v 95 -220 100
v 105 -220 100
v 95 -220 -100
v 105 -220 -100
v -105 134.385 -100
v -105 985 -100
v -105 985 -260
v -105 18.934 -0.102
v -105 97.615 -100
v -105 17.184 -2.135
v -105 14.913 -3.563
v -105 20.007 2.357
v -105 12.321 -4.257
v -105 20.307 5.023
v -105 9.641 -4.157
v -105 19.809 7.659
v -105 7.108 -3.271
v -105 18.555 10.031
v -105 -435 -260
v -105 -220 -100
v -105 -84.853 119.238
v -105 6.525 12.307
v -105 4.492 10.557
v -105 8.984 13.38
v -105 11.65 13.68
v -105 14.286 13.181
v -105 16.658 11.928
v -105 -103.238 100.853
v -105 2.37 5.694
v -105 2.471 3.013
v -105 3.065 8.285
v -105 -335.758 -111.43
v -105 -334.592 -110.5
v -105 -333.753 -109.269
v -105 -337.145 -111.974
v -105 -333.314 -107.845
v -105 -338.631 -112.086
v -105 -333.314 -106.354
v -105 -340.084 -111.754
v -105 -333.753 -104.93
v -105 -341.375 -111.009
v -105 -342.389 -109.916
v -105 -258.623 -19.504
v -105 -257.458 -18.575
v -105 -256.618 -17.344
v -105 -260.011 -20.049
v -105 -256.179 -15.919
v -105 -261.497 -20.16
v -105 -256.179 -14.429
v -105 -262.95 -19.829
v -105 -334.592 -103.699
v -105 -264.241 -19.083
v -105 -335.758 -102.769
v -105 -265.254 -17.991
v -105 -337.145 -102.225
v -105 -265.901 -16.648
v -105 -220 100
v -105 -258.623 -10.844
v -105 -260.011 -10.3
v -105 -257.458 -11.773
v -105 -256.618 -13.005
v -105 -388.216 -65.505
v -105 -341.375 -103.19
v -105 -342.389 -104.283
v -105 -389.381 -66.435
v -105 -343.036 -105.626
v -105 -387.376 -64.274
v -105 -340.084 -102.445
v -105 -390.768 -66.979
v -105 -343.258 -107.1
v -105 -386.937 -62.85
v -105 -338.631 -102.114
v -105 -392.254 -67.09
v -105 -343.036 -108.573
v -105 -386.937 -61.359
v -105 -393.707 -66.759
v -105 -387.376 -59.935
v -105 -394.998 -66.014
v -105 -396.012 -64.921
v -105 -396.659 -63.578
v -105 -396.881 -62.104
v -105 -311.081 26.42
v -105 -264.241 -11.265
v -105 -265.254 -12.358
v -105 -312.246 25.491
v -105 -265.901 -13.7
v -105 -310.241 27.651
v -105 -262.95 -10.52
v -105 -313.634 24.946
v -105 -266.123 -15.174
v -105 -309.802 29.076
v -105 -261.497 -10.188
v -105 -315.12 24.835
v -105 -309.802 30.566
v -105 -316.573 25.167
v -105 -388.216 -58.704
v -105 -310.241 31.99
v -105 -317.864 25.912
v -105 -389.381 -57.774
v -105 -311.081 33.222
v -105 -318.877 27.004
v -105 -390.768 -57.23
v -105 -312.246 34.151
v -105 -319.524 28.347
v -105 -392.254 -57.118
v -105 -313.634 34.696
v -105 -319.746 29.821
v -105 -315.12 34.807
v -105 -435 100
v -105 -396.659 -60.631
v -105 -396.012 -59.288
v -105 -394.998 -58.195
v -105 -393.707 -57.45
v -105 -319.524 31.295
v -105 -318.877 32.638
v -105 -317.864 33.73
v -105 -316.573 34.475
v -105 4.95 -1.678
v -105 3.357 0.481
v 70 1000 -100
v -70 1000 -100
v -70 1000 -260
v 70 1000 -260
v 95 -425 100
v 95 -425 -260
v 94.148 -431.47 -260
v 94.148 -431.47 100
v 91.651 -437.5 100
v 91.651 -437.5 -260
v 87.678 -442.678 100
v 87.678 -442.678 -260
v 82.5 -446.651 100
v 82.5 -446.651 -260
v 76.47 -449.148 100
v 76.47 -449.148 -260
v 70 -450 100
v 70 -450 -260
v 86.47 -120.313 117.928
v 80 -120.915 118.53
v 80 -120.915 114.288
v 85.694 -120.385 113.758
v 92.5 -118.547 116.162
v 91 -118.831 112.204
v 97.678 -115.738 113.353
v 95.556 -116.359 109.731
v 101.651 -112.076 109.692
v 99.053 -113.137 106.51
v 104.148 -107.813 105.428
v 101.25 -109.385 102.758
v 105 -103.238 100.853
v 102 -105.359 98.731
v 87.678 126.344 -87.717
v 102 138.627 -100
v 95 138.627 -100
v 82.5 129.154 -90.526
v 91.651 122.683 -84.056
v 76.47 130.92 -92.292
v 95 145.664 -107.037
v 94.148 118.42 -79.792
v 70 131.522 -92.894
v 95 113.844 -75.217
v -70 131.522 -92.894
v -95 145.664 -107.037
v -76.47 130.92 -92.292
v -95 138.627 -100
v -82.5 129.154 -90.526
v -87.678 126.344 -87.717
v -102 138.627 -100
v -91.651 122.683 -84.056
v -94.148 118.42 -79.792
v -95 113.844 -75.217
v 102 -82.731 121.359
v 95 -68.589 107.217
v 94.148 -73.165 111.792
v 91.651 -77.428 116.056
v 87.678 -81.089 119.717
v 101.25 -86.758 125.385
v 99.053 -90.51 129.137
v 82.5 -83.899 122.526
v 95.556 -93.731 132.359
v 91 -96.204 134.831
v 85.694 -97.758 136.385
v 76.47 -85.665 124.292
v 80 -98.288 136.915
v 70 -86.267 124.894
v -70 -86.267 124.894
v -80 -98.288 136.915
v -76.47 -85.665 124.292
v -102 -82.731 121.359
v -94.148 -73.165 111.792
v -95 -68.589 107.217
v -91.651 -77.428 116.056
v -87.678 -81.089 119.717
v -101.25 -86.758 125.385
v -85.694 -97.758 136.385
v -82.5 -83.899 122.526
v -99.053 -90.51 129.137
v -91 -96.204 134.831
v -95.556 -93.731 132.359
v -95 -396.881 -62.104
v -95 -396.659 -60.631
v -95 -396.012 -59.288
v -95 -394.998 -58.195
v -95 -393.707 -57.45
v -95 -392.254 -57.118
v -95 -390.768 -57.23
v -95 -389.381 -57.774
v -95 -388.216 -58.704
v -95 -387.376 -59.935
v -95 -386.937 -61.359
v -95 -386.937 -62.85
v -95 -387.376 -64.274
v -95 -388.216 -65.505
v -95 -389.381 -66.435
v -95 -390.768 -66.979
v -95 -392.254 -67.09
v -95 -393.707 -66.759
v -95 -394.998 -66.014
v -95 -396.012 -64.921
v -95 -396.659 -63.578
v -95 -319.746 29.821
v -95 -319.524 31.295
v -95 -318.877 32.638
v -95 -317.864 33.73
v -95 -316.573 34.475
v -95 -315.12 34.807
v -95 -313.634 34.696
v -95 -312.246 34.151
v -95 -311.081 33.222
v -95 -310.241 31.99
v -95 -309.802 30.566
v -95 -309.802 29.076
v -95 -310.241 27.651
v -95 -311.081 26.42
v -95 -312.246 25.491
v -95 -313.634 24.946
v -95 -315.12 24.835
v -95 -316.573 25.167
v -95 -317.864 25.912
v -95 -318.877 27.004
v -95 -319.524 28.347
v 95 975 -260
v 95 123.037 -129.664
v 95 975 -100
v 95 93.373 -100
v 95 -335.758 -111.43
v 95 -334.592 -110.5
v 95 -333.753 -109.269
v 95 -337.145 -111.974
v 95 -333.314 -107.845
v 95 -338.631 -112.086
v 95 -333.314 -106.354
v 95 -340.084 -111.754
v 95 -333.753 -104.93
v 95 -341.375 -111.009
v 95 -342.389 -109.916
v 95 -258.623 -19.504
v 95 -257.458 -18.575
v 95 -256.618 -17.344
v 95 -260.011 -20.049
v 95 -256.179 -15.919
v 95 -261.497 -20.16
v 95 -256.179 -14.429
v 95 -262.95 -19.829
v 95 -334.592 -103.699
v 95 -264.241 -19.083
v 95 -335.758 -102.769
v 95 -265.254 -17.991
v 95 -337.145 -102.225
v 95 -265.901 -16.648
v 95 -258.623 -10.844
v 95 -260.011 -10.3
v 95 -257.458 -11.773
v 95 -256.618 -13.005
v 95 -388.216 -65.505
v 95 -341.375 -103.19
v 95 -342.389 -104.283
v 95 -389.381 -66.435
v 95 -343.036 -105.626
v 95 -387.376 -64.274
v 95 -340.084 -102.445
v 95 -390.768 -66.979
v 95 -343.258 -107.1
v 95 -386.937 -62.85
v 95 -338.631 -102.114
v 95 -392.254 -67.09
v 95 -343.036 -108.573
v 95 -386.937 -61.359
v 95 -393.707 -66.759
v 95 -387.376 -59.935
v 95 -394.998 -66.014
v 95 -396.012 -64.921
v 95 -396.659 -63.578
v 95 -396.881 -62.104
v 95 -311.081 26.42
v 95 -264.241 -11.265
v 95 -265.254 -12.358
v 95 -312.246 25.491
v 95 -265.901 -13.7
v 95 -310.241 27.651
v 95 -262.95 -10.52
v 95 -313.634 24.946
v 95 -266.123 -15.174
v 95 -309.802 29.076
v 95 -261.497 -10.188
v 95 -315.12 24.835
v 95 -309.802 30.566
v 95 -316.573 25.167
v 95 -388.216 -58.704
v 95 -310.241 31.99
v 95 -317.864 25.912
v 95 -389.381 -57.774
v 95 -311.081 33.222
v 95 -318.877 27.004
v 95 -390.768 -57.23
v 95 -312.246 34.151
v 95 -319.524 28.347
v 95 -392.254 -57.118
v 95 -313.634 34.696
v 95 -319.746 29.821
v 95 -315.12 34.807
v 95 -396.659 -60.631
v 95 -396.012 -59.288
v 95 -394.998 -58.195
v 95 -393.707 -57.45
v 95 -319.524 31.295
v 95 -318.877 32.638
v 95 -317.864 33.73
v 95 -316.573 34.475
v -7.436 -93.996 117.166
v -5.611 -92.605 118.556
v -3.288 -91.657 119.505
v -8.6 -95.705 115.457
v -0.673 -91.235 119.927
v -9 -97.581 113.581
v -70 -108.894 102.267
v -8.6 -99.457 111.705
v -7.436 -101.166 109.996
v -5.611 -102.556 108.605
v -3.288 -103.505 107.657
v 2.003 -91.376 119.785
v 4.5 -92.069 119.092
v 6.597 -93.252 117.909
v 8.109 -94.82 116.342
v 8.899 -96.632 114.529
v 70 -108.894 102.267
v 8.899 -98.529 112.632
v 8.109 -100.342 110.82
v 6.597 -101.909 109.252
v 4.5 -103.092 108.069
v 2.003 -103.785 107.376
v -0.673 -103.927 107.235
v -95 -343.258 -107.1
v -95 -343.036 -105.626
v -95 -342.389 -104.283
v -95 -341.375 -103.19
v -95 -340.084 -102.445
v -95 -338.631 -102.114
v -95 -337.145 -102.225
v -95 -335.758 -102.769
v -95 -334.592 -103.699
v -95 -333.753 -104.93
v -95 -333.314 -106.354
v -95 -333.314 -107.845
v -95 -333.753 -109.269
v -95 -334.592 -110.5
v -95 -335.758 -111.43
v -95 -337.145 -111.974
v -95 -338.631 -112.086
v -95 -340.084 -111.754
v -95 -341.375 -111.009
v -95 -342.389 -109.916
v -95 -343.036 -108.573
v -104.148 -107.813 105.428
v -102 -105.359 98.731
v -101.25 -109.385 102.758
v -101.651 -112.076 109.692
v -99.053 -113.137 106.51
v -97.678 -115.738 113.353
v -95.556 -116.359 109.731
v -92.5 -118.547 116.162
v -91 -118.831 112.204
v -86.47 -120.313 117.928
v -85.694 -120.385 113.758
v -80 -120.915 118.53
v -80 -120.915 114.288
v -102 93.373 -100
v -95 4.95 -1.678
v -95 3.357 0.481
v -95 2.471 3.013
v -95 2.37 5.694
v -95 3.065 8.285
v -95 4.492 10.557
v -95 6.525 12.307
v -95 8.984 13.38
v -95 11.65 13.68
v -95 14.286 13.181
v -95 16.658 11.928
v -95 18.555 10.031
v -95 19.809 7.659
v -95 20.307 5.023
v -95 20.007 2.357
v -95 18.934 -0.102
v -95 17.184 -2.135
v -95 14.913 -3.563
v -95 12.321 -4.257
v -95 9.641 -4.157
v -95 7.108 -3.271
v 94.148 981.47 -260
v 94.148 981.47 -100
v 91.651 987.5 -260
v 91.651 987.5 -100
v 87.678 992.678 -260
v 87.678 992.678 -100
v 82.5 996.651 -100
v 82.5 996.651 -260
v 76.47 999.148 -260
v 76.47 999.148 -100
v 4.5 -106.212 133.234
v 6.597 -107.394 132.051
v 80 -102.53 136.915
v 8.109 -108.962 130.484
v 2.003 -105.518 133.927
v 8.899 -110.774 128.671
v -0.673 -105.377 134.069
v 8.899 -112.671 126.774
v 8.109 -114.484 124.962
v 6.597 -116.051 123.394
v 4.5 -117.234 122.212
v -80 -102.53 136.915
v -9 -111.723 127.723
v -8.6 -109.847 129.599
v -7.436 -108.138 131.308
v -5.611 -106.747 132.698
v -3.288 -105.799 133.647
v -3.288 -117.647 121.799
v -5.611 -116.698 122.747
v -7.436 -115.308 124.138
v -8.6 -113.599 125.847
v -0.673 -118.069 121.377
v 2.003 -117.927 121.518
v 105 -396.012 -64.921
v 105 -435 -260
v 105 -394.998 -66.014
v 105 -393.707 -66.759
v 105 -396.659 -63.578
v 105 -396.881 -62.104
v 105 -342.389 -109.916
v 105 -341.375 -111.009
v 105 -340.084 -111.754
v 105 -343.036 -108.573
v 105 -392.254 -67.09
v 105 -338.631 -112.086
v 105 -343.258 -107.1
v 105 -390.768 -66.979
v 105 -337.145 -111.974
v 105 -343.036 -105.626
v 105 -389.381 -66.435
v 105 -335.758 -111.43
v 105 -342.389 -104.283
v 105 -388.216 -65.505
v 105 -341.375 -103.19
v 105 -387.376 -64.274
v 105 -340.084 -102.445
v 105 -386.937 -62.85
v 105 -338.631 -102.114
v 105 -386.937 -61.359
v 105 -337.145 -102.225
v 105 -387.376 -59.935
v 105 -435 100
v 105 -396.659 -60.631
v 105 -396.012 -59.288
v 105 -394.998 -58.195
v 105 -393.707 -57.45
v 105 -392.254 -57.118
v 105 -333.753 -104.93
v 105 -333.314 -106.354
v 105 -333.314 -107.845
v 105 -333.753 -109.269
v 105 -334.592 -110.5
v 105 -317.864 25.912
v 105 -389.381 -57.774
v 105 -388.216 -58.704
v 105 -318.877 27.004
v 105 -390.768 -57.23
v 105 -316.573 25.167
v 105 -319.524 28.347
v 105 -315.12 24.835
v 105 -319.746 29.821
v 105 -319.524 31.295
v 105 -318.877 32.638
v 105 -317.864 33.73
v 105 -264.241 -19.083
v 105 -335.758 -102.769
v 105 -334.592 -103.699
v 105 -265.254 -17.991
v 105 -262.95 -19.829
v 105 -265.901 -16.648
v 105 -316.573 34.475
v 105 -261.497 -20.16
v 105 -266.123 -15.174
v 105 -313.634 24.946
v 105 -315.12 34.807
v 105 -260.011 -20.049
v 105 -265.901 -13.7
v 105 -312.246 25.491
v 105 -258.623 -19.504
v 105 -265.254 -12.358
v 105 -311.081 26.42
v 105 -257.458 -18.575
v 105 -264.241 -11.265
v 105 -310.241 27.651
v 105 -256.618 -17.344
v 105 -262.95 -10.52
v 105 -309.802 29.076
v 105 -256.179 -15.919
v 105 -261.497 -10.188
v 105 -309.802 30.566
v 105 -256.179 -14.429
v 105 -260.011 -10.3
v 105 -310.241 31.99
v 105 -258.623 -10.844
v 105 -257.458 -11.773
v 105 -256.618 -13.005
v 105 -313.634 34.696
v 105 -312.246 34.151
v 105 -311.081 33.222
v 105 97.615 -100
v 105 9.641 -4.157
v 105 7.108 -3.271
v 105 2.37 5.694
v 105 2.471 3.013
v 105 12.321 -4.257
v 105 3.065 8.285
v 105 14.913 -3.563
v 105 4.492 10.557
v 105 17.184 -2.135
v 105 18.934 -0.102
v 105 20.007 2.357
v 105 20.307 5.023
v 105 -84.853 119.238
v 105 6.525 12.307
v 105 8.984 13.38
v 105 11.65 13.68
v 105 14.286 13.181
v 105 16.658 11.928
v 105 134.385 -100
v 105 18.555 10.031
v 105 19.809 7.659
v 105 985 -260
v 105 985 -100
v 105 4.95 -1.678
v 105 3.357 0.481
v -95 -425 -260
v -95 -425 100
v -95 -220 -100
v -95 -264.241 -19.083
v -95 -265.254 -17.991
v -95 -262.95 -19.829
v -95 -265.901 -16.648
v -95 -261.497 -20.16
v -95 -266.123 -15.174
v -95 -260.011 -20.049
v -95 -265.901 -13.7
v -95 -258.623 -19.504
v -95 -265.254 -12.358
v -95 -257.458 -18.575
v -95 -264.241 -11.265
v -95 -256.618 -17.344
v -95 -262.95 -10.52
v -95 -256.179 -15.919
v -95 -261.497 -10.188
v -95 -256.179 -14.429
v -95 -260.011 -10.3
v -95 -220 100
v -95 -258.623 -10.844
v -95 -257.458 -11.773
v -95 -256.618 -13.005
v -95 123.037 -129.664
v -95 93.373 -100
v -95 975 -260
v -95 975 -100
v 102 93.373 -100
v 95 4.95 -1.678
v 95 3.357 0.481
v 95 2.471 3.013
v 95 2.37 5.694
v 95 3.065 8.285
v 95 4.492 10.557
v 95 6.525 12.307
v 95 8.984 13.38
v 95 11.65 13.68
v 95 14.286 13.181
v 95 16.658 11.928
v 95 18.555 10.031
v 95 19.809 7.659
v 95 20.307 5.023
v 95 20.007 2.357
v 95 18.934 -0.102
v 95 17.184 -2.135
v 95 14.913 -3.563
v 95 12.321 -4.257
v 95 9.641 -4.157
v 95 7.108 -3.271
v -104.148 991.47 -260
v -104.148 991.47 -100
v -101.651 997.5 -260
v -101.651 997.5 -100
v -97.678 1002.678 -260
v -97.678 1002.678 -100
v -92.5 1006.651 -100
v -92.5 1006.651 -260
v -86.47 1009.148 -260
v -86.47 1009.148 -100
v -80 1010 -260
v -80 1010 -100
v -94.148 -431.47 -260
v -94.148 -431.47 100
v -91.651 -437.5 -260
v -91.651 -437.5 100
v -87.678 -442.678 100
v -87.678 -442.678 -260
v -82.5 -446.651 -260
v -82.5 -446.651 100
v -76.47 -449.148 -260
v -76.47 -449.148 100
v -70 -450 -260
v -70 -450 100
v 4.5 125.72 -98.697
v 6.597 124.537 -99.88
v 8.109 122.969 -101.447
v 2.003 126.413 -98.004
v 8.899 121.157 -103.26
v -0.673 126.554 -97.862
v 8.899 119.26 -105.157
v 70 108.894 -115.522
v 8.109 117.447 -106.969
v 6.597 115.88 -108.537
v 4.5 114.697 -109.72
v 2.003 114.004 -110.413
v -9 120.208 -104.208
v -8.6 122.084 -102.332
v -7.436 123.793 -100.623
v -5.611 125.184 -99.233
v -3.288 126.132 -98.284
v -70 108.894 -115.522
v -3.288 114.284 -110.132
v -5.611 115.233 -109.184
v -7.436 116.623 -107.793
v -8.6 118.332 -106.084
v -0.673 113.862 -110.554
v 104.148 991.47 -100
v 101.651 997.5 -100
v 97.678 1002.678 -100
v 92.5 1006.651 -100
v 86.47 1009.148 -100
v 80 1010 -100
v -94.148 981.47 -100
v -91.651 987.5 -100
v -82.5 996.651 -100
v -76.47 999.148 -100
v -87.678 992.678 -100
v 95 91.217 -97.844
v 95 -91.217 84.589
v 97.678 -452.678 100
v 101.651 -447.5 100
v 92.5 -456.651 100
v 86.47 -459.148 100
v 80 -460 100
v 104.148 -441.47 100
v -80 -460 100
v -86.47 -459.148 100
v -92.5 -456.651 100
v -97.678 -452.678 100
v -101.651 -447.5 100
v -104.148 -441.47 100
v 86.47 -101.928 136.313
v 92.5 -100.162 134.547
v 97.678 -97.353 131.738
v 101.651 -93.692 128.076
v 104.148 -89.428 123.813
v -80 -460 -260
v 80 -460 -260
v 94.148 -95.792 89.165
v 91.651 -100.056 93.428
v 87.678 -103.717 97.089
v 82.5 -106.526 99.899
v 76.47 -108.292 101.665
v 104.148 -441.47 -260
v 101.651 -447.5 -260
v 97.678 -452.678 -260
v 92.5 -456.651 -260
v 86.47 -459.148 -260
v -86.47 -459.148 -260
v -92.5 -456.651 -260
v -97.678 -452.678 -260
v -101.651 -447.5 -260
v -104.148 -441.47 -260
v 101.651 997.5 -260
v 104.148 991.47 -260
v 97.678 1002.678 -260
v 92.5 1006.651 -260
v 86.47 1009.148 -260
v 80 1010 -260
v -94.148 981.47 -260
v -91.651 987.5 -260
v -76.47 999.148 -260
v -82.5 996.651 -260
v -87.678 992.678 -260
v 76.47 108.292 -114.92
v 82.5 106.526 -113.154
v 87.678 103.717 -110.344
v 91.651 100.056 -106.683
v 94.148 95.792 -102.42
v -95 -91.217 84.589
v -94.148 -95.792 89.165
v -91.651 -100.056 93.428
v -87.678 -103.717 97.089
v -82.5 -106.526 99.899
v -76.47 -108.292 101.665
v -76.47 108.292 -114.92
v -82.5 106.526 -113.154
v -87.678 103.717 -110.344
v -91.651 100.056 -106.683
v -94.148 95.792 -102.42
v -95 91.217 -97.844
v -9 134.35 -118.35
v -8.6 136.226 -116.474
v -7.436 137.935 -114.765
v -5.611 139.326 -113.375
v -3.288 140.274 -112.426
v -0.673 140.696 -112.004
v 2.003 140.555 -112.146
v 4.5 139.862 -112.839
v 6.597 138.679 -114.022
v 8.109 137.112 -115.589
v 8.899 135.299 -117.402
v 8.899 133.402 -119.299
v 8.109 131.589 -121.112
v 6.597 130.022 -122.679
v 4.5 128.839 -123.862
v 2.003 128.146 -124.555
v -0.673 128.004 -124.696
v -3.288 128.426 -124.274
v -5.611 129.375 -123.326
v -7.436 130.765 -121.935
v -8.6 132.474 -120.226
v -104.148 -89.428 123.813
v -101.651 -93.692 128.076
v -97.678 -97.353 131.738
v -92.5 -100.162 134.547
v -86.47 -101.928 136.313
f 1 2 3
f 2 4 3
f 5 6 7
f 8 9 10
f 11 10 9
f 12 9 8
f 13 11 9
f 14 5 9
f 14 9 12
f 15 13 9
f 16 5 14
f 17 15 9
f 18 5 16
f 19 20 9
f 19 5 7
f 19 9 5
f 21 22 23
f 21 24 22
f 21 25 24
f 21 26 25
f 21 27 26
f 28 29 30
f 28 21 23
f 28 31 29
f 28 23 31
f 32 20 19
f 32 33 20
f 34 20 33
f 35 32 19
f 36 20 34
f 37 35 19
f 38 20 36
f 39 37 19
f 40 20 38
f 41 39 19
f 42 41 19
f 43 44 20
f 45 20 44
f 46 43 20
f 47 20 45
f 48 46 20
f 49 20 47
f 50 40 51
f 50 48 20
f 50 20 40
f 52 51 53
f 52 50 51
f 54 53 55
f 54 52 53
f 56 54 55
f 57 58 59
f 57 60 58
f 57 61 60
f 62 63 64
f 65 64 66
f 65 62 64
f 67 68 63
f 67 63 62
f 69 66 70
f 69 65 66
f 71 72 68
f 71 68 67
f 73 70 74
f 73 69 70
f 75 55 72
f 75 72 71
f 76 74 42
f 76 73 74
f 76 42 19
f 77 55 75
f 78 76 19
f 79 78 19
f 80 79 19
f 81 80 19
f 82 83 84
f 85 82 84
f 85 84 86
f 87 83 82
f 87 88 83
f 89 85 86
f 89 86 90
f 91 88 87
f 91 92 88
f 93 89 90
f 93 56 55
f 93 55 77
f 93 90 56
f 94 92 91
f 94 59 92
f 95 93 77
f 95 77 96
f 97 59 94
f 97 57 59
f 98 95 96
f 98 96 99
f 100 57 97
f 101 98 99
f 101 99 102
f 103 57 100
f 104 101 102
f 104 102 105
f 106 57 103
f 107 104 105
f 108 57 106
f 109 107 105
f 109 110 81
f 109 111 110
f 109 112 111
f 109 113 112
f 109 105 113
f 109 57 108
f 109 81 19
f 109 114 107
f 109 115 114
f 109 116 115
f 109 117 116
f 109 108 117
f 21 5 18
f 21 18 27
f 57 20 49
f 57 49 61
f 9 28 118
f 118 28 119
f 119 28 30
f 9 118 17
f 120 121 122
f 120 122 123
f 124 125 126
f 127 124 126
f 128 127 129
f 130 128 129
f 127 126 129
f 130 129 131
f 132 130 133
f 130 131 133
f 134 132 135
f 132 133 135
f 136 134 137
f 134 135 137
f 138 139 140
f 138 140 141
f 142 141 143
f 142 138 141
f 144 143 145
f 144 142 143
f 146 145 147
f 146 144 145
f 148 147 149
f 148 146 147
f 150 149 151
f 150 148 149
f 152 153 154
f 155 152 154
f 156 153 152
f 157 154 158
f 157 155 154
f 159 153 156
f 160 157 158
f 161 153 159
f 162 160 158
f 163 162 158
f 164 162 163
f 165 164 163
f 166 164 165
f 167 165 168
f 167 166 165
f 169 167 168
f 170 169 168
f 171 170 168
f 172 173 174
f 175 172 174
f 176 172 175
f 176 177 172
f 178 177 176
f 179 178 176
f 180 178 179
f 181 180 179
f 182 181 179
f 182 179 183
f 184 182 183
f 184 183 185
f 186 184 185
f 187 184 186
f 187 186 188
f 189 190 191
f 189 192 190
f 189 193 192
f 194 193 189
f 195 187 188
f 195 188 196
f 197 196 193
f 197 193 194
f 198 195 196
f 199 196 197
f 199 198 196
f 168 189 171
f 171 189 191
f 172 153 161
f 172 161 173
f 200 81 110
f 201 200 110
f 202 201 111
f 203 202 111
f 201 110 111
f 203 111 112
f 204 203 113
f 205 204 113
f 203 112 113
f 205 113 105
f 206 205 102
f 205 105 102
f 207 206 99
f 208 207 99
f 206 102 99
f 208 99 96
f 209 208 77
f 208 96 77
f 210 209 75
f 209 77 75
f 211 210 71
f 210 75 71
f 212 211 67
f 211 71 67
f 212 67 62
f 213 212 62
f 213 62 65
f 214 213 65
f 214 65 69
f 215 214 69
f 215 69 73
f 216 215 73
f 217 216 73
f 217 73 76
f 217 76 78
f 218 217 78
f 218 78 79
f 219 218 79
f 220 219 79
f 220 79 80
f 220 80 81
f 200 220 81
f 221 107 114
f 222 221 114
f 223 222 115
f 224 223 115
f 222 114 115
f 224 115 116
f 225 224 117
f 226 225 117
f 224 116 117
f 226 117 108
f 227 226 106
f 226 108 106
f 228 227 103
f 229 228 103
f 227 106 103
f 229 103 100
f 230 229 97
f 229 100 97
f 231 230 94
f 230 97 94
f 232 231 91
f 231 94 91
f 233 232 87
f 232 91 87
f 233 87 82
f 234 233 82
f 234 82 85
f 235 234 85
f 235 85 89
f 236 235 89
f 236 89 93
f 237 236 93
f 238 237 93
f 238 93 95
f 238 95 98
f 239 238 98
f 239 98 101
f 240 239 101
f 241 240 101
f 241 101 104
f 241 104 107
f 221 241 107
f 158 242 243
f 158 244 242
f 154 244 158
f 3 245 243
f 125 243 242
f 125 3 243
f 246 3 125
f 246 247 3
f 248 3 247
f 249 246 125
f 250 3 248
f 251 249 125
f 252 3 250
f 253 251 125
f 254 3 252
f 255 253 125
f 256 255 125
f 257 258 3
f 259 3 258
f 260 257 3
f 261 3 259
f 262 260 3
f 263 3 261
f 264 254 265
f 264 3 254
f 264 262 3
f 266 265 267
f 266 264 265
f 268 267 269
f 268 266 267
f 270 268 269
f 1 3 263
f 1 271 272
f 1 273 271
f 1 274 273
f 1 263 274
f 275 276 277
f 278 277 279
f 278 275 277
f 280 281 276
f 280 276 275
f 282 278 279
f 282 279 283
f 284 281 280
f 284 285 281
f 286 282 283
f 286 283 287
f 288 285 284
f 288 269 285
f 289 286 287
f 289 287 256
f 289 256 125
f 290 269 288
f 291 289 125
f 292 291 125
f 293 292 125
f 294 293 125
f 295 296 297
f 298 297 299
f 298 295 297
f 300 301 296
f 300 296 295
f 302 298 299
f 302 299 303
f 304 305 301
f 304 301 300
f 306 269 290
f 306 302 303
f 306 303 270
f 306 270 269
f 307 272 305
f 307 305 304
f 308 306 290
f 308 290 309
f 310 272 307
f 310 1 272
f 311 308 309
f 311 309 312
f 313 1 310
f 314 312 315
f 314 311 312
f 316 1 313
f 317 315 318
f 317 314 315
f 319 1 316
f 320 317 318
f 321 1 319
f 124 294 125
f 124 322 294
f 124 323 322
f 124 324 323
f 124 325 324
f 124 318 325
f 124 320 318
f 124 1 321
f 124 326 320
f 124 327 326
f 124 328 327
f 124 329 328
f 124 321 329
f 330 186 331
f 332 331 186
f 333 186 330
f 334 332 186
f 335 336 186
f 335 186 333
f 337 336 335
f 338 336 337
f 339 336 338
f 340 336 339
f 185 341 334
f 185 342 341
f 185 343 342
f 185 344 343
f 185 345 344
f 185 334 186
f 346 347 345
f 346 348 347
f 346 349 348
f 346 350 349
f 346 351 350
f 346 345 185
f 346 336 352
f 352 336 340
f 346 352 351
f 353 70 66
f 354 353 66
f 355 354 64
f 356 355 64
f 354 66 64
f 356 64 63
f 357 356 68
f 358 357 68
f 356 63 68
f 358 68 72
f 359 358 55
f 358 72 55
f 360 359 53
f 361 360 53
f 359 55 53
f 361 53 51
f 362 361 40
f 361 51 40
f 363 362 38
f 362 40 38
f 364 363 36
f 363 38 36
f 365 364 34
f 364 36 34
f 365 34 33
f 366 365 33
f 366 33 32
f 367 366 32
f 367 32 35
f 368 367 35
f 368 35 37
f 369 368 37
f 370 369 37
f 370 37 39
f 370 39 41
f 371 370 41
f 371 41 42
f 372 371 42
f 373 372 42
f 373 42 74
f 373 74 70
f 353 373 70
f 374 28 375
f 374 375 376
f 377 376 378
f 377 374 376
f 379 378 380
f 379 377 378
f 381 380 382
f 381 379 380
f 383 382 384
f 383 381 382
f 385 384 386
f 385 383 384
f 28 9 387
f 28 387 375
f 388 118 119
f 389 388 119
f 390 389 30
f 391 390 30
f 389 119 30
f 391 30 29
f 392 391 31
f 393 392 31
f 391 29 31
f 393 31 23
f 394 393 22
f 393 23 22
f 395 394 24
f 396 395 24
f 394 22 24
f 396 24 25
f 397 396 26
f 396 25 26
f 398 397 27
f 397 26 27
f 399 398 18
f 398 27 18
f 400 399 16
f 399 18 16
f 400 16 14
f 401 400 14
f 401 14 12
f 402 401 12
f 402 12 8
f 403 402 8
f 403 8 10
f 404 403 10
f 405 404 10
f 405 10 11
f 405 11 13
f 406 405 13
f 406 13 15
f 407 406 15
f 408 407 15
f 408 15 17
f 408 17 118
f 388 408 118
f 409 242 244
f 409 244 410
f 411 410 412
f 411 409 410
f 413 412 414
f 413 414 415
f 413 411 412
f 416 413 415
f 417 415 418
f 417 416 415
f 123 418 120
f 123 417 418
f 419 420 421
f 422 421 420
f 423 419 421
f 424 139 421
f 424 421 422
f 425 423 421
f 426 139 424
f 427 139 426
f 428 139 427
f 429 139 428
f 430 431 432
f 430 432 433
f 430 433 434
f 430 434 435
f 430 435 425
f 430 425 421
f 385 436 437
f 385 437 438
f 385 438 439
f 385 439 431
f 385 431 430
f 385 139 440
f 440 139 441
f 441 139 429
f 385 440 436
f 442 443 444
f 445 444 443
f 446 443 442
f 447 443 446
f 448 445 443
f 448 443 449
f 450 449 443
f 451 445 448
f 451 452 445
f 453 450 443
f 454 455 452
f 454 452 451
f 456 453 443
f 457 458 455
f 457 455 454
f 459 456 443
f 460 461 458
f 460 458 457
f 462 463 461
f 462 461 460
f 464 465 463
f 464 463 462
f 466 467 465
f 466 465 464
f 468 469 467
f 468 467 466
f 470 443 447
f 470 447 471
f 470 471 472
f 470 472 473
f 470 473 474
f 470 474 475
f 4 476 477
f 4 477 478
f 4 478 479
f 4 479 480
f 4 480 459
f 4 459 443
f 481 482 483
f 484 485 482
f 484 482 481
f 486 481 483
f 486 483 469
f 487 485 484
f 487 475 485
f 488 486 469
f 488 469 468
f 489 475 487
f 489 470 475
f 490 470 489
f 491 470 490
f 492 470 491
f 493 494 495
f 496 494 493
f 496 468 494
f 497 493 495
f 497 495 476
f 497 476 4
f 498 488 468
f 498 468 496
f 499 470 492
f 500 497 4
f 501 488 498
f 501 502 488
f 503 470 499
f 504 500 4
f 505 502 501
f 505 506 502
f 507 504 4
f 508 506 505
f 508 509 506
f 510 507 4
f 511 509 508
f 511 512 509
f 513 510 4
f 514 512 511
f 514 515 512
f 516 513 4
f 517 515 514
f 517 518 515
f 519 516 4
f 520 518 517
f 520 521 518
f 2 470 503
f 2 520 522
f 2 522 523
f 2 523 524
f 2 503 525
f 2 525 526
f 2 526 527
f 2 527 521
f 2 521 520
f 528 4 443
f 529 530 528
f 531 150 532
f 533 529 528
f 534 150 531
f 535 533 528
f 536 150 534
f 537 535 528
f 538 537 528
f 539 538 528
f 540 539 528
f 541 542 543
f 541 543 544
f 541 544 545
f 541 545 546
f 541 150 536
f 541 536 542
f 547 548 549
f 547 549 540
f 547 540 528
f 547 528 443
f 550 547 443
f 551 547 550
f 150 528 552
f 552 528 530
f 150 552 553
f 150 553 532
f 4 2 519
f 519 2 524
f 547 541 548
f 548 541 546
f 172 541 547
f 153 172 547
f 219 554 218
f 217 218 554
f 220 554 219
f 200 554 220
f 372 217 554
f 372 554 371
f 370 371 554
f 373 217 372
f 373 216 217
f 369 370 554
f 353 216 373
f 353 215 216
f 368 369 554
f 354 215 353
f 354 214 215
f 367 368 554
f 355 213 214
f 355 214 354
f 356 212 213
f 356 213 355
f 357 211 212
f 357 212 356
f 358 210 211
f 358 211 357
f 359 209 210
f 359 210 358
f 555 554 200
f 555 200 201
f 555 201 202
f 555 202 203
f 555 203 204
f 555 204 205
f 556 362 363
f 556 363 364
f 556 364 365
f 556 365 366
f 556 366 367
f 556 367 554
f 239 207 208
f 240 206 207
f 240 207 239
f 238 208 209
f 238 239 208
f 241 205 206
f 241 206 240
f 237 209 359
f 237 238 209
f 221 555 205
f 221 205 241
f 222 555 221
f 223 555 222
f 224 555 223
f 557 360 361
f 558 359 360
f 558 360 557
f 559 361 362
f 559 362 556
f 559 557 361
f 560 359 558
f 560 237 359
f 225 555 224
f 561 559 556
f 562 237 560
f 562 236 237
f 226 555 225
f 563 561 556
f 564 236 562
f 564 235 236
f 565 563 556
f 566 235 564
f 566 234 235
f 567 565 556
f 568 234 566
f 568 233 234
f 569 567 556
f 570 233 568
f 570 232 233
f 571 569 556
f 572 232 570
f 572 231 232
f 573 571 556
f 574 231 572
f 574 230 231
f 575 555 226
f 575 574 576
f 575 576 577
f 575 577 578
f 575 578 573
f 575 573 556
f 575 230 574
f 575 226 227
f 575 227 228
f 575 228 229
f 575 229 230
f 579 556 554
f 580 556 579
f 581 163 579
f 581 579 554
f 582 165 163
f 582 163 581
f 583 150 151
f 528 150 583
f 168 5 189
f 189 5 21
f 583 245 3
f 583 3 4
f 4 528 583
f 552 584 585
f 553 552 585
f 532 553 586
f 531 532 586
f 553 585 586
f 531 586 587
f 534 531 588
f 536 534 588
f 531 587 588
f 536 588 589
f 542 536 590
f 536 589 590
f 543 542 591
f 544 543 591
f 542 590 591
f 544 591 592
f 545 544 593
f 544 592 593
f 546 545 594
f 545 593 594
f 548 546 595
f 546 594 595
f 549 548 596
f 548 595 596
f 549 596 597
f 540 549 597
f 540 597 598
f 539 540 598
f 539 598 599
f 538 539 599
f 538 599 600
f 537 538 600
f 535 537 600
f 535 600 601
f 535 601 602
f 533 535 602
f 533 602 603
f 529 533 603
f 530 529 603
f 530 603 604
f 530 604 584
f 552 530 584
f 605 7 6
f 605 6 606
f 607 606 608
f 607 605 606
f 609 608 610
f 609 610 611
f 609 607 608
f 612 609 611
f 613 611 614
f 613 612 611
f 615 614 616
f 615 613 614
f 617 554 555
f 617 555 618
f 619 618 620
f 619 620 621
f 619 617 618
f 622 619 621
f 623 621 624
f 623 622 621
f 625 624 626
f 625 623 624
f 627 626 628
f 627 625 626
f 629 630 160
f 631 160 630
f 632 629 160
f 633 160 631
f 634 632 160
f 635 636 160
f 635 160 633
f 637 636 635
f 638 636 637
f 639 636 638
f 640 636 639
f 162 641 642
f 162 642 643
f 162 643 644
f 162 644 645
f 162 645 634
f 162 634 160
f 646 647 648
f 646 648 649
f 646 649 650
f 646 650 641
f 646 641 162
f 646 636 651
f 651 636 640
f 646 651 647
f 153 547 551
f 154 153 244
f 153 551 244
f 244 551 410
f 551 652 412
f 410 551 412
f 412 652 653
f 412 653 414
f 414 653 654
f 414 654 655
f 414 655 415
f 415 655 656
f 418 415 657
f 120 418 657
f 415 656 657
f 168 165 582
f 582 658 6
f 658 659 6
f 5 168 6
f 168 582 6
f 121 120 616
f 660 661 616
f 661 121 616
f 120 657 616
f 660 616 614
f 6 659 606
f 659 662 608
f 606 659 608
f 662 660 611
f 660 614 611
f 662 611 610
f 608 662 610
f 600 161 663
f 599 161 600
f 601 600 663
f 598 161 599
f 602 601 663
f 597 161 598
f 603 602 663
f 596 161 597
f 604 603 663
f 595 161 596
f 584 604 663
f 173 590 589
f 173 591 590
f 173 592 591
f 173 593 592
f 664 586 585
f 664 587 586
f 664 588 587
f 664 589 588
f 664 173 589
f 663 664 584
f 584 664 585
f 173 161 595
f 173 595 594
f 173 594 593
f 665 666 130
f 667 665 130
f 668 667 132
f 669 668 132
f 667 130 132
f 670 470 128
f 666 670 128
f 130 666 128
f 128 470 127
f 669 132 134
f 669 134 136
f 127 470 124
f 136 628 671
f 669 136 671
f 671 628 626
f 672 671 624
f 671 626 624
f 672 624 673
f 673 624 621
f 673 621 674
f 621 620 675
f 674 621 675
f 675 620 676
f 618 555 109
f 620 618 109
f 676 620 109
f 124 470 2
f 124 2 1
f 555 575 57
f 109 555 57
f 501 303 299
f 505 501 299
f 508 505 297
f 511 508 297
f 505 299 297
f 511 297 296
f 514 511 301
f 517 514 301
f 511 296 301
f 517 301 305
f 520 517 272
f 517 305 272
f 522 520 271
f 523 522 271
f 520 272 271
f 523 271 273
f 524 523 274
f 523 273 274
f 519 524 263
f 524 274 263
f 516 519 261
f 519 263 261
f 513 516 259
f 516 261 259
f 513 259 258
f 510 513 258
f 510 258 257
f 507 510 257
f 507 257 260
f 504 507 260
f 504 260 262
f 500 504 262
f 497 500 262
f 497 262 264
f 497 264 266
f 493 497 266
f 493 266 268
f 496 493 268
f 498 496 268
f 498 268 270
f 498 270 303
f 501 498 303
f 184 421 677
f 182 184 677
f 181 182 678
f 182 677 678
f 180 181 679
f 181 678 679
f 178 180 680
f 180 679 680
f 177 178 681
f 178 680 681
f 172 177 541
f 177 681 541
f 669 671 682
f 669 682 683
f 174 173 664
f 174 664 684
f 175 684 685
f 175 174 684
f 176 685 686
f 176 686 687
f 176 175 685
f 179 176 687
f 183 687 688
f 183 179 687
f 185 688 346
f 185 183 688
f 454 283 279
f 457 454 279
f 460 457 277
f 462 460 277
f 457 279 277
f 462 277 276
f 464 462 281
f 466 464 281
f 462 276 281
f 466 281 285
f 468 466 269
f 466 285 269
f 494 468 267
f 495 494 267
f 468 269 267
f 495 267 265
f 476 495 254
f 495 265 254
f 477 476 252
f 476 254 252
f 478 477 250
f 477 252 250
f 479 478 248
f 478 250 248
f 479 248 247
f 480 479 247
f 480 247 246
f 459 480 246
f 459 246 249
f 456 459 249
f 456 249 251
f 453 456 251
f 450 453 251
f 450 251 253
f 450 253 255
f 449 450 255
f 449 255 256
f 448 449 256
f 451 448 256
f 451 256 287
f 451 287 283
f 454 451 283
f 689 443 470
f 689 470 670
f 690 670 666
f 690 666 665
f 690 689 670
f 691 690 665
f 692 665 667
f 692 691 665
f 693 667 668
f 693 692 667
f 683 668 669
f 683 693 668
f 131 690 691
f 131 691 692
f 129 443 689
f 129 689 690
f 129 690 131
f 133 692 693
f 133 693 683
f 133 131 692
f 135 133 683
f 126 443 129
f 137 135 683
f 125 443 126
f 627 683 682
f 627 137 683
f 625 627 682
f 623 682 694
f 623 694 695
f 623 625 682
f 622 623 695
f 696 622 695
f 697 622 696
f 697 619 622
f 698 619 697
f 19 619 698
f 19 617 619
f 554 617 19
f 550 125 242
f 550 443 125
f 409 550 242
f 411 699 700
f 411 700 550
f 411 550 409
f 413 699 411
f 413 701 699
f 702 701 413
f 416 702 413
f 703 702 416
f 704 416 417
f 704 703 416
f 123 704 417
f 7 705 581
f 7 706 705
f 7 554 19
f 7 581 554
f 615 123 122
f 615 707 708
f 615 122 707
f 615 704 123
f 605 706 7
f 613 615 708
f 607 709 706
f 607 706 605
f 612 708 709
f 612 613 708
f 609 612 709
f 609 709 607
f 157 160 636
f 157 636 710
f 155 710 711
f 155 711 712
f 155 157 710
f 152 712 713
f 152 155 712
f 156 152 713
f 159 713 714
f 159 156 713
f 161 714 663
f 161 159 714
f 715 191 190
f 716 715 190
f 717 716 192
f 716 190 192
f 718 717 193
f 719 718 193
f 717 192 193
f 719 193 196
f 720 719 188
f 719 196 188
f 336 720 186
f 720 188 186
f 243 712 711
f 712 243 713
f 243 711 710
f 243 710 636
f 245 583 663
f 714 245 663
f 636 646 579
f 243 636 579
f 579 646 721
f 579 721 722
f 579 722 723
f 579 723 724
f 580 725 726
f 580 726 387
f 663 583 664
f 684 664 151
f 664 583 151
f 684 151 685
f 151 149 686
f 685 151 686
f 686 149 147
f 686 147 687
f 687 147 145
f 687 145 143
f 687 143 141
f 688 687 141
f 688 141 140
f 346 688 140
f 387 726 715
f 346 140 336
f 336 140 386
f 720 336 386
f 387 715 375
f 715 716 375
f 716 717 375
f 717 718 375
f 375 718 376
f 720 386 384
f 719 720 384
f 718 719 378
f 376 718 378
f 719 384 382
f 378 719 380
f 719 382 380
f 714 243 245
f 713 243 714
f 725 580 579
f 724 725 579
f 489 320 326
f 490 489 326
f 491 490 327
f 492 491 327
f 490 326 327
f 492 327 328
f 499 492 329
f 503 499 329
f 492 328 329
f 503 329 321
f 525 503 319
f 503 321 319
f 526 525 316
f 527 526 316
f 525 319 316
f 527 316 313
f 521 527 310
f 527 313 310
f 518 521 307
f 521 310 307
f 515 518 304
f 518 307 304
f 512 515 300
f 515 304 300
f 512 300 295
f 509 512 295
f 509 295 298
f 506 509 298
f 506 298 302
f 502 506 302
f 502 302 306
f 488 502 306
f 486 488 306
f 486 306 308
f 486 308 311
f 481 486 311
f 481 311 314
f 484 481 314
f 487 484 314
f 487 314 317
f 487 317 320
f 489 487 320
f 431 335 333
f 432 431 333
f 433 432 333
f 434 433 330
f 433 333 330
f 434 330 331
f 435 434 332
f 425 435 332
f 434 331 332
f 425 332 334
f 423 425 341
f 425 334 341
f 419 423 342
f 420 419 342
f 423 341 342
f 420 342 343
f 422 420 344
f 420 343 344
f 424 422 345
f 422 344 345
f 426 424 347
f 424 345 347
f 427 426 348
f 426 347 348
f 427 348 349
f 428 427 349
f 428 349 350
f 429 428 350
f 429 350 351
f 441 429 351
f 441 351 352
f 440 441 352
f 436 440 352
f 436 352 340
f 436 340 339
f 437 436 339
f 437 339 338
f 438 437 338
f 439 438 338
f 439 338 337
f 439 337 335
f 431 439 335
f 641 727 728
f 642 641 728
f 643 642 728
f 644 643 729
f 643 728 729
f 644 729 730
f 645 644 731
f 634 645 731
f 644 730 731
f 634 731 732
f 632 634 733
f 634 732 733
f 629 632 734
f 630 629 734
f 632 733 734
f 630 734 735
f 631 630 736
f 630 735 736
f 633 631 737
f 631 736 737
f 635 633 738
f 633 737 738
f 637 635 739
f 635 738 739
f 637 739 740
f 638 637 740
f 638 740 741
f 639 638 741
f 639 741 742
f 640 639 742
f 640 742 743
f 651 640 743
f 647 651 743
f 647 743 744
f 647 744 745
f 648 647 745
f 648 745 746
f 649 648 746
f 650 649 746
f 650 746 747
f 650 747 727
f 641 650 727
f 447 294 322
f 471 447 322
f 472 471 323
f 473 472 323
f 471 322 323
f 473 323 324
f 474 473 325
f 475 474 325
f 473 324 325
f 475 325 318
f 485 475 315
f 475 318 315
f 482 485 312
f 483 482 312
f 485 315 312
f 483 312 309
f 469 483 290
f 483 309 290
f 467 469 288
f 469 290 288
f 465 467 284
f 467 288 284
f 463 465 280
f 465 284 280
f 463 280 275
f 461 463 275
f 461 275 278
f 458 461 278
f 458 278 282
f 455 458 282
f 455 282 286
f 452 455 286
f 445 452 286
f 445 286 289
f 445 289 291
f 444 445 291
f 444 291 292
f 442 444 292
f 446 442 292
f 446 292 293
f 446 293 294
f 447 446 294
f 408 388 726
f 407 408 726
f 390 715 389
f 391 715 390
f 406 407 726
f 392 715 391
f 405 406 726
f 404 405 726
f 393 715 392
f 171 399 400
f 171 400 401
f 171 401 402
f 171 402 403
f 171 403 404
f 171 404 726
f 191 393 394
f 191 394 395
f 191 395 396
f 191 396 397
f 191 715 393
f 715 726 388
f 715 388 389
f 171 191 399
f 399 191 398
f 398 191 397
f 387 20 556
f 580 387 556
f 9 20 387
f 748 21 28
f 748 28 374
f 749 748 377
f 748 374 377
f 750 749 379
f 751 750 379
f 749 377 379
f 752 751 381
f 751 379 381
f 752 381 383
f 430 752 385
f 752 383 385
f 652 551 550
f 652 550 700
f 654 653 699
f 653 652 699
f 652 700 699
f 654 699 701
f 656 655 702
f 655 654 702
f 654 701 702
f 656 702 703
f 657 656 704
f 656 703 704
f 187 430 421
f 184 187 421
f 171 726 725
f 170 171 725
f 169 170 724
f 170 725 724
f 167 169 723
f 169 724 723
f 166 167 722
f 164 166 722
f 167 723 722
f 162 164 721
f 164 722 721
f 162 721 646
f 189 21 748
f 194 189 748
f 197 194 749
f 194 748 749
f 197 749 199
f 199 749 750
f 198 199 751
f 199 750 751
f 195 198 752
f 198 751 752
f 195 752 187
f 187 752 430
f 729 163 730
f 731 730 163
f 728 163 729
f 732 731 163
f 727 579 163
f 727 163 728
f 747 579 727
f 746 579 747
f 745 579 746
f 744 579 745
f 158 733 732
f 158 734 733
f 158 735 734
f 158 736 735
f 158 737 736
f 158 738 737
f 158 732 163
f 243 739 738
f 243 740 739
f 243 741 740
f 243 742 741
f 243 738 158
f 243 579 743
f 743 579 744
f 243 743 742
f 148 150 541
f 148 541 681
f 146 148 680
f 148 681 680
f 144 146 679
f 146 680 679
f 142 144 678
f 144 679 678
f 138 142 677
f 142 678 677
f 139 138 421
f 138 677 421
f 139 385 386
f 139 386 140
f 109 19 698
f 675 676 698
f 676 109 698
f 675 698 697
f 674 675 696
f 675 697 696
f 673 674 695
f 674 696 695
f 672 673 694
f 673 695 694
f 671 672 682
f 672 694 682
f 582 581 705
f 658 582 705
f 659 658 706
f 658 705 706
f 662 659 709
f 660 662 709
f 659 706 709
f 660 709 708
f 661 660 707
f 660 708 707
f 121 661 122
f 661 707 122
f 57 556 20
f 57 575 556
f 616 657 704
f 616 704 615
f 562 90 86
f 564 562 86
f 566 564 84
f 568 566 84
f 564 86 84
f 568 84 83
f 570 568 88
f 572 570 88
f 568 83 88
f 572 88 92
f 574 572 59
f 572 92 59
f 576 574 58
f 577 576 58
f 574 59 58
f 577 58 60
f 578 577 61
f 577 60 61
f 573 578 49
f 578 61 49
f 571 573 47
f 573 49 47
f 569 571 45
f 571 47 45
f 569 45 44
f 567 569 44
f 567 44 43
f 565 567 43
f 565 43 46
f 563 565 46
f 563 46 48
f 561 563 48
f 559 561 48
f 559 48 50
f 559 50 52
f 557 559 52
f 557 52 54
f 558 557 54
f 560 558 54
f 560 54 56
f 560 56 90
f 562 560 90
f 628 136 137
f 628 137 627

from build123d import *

# Parameters (mm, degrees)
F1_DEPTH      = 16
F3_D          = 18
F5_D          = 18
F6_ANGLE      = 45
F8_START      = -100
F8_DEPTH      = 160
F9_DEPTH      = 100
F9_DEPTH_BACK = 100
F10_T1_DEPTH  = 32
F10_T3_DEPTH  = 32
F10_T5_DEPTH  = 360
F10_T7_DEPTH  = 160
F10_T9_DEPTH  = 157
F10_T11_DEPTH = 157
F10_T13_DEPTH = 485
F10_T15_DEPTH = 285
F11_SIZE      = 3
F13_D         = 10


# Not quite as in the source:
# - a fillet or chamfer that OpenCascade refuses, or shapes differently, is made with other operations: its cross-section is extruded or revolved along the edge and cut away or added


with BuildPart() as f1:
    # F0 (on Front) → F1 (new body, symmetric)
    with BuildSketch(Plane.XZ):
        Polygon((-95, 16), (-105, 16), (-105, -16), (-105, -174), (105, -174), (105, -16), (105, 16), (95, 16), (95, -16), (95, -154), (-95, -154), (-95, -16), align=None)
        Polygon((-105, 174), (-105, 16), (-95, 16), (-95, 154), (95, 154), (95, 16), (105, 16), (105, 174), align=None)
    extrude(amount=F1_DEPTH, both=True)

    # F3 (through all)
    with Locations(Plane.YZ.offset(105)):
        with Locations((0, 0)):
            Hole(F3_D / 2)

    # F5 (through all)
    with Locations(Plane.XY.offset(174)):
        with Locations((0, 0)):
            Hole(F5_D / 2)


with BuildPart() as f1_1:
    # F6: moved
    add(f1.part.rotate(Axis((0, 0, 16), (1, 0, 0)), F6_ANGLE))

    # F7 (on Top) → F8 (join)
    with BuildSketch(Plane.XY.offset(F8_START)):
        Polygon((0, 1010), (-105, 1010), (-105, -220), (-95, -220), (-95, 1000), (0, 1000), (95, 1000), (95, -220), (105, -220), (105, 1010), align=None)
        Polygon((-95, -220), (-105, -220), (-105, -460), (0, -460), (105, -460), (105, -220), (95, -220), (95, -450), (0, -450), (-95, -450), align=None)
    extrude(amount=-F8_DEPTH)

    # F7 (on Top) → F9 (join, two sides)
    with BuildSketch(Plane.XY) as f9_sk:
        Polygon((-95, -220), (-105, -220), (-105, -460), (0, -460), (105, -460), (105, -220), (95, -220), (95, -450), (0, -450), (-95, -450), align=None)
    extrude(amount=F9_DEPTH)
    extrude(f9_sk.sketch, amount=-F9_DEPTH_BACK)

    # F10: fillet of radius 25 on 14 edges, made by hand

    # F10_s2 → F10_t1 (join)
    with BuildSketch(Plane(origin=(0, -3.313708499, -3.313708499), x_dir=(1, 0, 0), z_dir=(0, 0.7071067812, 0.7071067812))):
        with BuildLine():
            ThreePointArc((-95, 133.686291501), (-87.6776695297, 151.3639610307), (-70, 158.686291501))
            Line((-70, 158.686291501), (-95, 158.686291501))
            Line((-95, 158.686291501), (-95, 133.686291501))
        make_face()
    extrude(amount=F10_T1_DEPTH)

    # F10_s4 → F10_t3 (join)
    with BuildSketch(Plane(origin=(0, 19.313708499, 19.313708499), x_dir=(1, 0, 0), z_dir=(0, -0.7071067812, -0.7071067812))):
        with BuildLine():
            ThreePointArc((70, -158.686291501), (87.6776695297, -151.3639610307), (95, -133.686291501))
            Line((95, -133.686291501), (95, -158.686291501))
            Line((95, -158.686291501), (70, -158.686291501))
        make_face()
        with BuildLine():
            ThreePointArc((95, 124.313708499), (87.6776695297, 141.9913780286), (70, 149.313708499))
            Line((70, 149.313708499), (95, 149.313708499))
            Line((95, 149.313708499), (95, 124.313708499))
        make_face()
        with BuildLine():
            ThreePointArc((-95, 124.313708499), (-87.6776695297, 141.9913780286), (-70, 149.313708499))
            Line((-70, 149.313708499), (-95, 149.313708499))
            Line((-95, 149.313708499), (-95, 124.313708499))
        make_face()
    extrude(amount=F10_T3_DEPTH)

    # F10_s6 → F10_t5 (join)
    with BuildSketch(Plane.XY.offset(-260)):
        with BuildLine():
            ThreePointArc((-95, -425), (-87.6776695297, -442.6776695297), (-70, -450))
            Line((-70, -450), (-95, -450))
            Line((-95, -450), (-95, -425))
        make_face()
        with BuildLine():
            ThreePointArc((95, -425), (87.6776695297, -442.6776695297), (70, -450))
            Line((70, -450), (95, -450))
            Line((95, -450), (95, -425))
        make_face()
    extrude(amount=F10_T5_DEPTH)

    # F10_s8 → F10_t7 (join)
    with BuildSketch(Plane.XY.offset(-260)):
        with BuildLine():
            ThreePointArc((95, 975), (87.6776695297, 992.6776695297), (70, 1000))
            Line((70, 1000), (95, 1000))
            Line((95, 1000), (95, 975))
        make_face()
        with BuildLine():
            ThreePointArc((-95, 975), (-87.6776695297, 992.6776695297), (-70, 1000))
            Line((-70, 1000), (-95, 1000))
            Line((-95, 1000), (-95, 975))
        make_face()
    extrude(amount=F10_T7_DEPTH)

    # F10_s10 → F10_t9 (cut)
    with BuildSketch(Plane(origin=(0, 63.5078823231, 63.5078823231), x_dir=(1, 0, 0), z_dir=(0, -0.7071067812, -0.7071067812))):
        with BuildLine():
            ThreePointArc((105, 144.313708499), (97.6776695297, 161.9913780286), (80, 169.313708499))
            Line((80, 169.313708499), (105, 169.313708499))
            Line((105, 169.313708499), (105, 144.313708499))
        make_face()
    extrude(amount=F10_T9_DEPTH, mode=Mode.SUBTRACT)

    # F10_s12 → F10_t11 (cut)
    with BuildSketch(Plane(origin=(0, -47.5078823231, -47.5078823231), x_dir=(1, 0, 0), z_dir=(0, 0.7071067812, 0.7071067812))):
        with BuildLine():
            ThreePointArc((-105, -144.313708499), (-97.6776695297, -161.9913780286), (-80, -169.313708499))
            Line((-80, -169.313708499), (-105, -169.313708499))
            Line((-105, -169.313708499), (-105, -144.313708499))
        make_face()
    extrude(amount=F10_T11_DEPTH, mode=Mode.SUBTRACT)

    # F10_s14 → F10_t13 (cut)
    with BuildSketch(Plane.XY.offset(-322.5)):
        with BuildLine():
            ThreePointArc((-105, -435), (-97.6776695297, -452.6776695297), (-80, -460))
            Line((-80, -460), (-105, -460))
            Line((-105, -460), (-105, -435))
        make_face()
        with BuildLine():
            ThreePointArc((105, -435), (97.6776695297, -452.6776695297), (80, -460))
            Line((80, -460), (105, -460))
            Line((105, -460), (105, -435))
        make_face()
    extrude(amount=F10_T13_DEPTH, mode=Mode.SUBTRACT)

    # F10_s16 → F10_t15 (cut)
    with BuildSketch(Plane.XY.offset(-322.5)):
        with BuildLine():
            ThreePointArc((105, 985), (97.6776695297, 1002.6776695297), (80, 1010))
            Line((80, 1010), (105, 1010))
            Line((105, 1010), (105, 985))
        make_face()
        with BuildLine():
            ThreePointArc((-105, 985), (-97.6776695297, 1002.6776695297), (-80, 1010))
            Line((-80, 1010), (-105, 1010))
            Line((-105, 1010), (-105, 985))
        make_face()
    extrude(amount=F10_T15_DEPTH, mode=Mode.SUBTRACT)

    # F11
    f11_edges = [f1_1.edges().sort_by_distance(p)[0] for p in [
        (97.67767, -95.231493, 133.85891),
        (97.67767, -117.85891, 111.231493),
    ]]
    chamfer(f11_edges, length=F11_SIZE)

    # F13 (through all)
    with Locations(Plane.YZ.offset(105)):
        with Locations((-314.7462682585, 29.8209178701), (-261.1231572401, -15.1742148079), (-338.2576704025, -107.0995479822), (-391.8807814209, -62.1044153042)):
            Hole(F13_D / 2)


solid = f1_1.part
